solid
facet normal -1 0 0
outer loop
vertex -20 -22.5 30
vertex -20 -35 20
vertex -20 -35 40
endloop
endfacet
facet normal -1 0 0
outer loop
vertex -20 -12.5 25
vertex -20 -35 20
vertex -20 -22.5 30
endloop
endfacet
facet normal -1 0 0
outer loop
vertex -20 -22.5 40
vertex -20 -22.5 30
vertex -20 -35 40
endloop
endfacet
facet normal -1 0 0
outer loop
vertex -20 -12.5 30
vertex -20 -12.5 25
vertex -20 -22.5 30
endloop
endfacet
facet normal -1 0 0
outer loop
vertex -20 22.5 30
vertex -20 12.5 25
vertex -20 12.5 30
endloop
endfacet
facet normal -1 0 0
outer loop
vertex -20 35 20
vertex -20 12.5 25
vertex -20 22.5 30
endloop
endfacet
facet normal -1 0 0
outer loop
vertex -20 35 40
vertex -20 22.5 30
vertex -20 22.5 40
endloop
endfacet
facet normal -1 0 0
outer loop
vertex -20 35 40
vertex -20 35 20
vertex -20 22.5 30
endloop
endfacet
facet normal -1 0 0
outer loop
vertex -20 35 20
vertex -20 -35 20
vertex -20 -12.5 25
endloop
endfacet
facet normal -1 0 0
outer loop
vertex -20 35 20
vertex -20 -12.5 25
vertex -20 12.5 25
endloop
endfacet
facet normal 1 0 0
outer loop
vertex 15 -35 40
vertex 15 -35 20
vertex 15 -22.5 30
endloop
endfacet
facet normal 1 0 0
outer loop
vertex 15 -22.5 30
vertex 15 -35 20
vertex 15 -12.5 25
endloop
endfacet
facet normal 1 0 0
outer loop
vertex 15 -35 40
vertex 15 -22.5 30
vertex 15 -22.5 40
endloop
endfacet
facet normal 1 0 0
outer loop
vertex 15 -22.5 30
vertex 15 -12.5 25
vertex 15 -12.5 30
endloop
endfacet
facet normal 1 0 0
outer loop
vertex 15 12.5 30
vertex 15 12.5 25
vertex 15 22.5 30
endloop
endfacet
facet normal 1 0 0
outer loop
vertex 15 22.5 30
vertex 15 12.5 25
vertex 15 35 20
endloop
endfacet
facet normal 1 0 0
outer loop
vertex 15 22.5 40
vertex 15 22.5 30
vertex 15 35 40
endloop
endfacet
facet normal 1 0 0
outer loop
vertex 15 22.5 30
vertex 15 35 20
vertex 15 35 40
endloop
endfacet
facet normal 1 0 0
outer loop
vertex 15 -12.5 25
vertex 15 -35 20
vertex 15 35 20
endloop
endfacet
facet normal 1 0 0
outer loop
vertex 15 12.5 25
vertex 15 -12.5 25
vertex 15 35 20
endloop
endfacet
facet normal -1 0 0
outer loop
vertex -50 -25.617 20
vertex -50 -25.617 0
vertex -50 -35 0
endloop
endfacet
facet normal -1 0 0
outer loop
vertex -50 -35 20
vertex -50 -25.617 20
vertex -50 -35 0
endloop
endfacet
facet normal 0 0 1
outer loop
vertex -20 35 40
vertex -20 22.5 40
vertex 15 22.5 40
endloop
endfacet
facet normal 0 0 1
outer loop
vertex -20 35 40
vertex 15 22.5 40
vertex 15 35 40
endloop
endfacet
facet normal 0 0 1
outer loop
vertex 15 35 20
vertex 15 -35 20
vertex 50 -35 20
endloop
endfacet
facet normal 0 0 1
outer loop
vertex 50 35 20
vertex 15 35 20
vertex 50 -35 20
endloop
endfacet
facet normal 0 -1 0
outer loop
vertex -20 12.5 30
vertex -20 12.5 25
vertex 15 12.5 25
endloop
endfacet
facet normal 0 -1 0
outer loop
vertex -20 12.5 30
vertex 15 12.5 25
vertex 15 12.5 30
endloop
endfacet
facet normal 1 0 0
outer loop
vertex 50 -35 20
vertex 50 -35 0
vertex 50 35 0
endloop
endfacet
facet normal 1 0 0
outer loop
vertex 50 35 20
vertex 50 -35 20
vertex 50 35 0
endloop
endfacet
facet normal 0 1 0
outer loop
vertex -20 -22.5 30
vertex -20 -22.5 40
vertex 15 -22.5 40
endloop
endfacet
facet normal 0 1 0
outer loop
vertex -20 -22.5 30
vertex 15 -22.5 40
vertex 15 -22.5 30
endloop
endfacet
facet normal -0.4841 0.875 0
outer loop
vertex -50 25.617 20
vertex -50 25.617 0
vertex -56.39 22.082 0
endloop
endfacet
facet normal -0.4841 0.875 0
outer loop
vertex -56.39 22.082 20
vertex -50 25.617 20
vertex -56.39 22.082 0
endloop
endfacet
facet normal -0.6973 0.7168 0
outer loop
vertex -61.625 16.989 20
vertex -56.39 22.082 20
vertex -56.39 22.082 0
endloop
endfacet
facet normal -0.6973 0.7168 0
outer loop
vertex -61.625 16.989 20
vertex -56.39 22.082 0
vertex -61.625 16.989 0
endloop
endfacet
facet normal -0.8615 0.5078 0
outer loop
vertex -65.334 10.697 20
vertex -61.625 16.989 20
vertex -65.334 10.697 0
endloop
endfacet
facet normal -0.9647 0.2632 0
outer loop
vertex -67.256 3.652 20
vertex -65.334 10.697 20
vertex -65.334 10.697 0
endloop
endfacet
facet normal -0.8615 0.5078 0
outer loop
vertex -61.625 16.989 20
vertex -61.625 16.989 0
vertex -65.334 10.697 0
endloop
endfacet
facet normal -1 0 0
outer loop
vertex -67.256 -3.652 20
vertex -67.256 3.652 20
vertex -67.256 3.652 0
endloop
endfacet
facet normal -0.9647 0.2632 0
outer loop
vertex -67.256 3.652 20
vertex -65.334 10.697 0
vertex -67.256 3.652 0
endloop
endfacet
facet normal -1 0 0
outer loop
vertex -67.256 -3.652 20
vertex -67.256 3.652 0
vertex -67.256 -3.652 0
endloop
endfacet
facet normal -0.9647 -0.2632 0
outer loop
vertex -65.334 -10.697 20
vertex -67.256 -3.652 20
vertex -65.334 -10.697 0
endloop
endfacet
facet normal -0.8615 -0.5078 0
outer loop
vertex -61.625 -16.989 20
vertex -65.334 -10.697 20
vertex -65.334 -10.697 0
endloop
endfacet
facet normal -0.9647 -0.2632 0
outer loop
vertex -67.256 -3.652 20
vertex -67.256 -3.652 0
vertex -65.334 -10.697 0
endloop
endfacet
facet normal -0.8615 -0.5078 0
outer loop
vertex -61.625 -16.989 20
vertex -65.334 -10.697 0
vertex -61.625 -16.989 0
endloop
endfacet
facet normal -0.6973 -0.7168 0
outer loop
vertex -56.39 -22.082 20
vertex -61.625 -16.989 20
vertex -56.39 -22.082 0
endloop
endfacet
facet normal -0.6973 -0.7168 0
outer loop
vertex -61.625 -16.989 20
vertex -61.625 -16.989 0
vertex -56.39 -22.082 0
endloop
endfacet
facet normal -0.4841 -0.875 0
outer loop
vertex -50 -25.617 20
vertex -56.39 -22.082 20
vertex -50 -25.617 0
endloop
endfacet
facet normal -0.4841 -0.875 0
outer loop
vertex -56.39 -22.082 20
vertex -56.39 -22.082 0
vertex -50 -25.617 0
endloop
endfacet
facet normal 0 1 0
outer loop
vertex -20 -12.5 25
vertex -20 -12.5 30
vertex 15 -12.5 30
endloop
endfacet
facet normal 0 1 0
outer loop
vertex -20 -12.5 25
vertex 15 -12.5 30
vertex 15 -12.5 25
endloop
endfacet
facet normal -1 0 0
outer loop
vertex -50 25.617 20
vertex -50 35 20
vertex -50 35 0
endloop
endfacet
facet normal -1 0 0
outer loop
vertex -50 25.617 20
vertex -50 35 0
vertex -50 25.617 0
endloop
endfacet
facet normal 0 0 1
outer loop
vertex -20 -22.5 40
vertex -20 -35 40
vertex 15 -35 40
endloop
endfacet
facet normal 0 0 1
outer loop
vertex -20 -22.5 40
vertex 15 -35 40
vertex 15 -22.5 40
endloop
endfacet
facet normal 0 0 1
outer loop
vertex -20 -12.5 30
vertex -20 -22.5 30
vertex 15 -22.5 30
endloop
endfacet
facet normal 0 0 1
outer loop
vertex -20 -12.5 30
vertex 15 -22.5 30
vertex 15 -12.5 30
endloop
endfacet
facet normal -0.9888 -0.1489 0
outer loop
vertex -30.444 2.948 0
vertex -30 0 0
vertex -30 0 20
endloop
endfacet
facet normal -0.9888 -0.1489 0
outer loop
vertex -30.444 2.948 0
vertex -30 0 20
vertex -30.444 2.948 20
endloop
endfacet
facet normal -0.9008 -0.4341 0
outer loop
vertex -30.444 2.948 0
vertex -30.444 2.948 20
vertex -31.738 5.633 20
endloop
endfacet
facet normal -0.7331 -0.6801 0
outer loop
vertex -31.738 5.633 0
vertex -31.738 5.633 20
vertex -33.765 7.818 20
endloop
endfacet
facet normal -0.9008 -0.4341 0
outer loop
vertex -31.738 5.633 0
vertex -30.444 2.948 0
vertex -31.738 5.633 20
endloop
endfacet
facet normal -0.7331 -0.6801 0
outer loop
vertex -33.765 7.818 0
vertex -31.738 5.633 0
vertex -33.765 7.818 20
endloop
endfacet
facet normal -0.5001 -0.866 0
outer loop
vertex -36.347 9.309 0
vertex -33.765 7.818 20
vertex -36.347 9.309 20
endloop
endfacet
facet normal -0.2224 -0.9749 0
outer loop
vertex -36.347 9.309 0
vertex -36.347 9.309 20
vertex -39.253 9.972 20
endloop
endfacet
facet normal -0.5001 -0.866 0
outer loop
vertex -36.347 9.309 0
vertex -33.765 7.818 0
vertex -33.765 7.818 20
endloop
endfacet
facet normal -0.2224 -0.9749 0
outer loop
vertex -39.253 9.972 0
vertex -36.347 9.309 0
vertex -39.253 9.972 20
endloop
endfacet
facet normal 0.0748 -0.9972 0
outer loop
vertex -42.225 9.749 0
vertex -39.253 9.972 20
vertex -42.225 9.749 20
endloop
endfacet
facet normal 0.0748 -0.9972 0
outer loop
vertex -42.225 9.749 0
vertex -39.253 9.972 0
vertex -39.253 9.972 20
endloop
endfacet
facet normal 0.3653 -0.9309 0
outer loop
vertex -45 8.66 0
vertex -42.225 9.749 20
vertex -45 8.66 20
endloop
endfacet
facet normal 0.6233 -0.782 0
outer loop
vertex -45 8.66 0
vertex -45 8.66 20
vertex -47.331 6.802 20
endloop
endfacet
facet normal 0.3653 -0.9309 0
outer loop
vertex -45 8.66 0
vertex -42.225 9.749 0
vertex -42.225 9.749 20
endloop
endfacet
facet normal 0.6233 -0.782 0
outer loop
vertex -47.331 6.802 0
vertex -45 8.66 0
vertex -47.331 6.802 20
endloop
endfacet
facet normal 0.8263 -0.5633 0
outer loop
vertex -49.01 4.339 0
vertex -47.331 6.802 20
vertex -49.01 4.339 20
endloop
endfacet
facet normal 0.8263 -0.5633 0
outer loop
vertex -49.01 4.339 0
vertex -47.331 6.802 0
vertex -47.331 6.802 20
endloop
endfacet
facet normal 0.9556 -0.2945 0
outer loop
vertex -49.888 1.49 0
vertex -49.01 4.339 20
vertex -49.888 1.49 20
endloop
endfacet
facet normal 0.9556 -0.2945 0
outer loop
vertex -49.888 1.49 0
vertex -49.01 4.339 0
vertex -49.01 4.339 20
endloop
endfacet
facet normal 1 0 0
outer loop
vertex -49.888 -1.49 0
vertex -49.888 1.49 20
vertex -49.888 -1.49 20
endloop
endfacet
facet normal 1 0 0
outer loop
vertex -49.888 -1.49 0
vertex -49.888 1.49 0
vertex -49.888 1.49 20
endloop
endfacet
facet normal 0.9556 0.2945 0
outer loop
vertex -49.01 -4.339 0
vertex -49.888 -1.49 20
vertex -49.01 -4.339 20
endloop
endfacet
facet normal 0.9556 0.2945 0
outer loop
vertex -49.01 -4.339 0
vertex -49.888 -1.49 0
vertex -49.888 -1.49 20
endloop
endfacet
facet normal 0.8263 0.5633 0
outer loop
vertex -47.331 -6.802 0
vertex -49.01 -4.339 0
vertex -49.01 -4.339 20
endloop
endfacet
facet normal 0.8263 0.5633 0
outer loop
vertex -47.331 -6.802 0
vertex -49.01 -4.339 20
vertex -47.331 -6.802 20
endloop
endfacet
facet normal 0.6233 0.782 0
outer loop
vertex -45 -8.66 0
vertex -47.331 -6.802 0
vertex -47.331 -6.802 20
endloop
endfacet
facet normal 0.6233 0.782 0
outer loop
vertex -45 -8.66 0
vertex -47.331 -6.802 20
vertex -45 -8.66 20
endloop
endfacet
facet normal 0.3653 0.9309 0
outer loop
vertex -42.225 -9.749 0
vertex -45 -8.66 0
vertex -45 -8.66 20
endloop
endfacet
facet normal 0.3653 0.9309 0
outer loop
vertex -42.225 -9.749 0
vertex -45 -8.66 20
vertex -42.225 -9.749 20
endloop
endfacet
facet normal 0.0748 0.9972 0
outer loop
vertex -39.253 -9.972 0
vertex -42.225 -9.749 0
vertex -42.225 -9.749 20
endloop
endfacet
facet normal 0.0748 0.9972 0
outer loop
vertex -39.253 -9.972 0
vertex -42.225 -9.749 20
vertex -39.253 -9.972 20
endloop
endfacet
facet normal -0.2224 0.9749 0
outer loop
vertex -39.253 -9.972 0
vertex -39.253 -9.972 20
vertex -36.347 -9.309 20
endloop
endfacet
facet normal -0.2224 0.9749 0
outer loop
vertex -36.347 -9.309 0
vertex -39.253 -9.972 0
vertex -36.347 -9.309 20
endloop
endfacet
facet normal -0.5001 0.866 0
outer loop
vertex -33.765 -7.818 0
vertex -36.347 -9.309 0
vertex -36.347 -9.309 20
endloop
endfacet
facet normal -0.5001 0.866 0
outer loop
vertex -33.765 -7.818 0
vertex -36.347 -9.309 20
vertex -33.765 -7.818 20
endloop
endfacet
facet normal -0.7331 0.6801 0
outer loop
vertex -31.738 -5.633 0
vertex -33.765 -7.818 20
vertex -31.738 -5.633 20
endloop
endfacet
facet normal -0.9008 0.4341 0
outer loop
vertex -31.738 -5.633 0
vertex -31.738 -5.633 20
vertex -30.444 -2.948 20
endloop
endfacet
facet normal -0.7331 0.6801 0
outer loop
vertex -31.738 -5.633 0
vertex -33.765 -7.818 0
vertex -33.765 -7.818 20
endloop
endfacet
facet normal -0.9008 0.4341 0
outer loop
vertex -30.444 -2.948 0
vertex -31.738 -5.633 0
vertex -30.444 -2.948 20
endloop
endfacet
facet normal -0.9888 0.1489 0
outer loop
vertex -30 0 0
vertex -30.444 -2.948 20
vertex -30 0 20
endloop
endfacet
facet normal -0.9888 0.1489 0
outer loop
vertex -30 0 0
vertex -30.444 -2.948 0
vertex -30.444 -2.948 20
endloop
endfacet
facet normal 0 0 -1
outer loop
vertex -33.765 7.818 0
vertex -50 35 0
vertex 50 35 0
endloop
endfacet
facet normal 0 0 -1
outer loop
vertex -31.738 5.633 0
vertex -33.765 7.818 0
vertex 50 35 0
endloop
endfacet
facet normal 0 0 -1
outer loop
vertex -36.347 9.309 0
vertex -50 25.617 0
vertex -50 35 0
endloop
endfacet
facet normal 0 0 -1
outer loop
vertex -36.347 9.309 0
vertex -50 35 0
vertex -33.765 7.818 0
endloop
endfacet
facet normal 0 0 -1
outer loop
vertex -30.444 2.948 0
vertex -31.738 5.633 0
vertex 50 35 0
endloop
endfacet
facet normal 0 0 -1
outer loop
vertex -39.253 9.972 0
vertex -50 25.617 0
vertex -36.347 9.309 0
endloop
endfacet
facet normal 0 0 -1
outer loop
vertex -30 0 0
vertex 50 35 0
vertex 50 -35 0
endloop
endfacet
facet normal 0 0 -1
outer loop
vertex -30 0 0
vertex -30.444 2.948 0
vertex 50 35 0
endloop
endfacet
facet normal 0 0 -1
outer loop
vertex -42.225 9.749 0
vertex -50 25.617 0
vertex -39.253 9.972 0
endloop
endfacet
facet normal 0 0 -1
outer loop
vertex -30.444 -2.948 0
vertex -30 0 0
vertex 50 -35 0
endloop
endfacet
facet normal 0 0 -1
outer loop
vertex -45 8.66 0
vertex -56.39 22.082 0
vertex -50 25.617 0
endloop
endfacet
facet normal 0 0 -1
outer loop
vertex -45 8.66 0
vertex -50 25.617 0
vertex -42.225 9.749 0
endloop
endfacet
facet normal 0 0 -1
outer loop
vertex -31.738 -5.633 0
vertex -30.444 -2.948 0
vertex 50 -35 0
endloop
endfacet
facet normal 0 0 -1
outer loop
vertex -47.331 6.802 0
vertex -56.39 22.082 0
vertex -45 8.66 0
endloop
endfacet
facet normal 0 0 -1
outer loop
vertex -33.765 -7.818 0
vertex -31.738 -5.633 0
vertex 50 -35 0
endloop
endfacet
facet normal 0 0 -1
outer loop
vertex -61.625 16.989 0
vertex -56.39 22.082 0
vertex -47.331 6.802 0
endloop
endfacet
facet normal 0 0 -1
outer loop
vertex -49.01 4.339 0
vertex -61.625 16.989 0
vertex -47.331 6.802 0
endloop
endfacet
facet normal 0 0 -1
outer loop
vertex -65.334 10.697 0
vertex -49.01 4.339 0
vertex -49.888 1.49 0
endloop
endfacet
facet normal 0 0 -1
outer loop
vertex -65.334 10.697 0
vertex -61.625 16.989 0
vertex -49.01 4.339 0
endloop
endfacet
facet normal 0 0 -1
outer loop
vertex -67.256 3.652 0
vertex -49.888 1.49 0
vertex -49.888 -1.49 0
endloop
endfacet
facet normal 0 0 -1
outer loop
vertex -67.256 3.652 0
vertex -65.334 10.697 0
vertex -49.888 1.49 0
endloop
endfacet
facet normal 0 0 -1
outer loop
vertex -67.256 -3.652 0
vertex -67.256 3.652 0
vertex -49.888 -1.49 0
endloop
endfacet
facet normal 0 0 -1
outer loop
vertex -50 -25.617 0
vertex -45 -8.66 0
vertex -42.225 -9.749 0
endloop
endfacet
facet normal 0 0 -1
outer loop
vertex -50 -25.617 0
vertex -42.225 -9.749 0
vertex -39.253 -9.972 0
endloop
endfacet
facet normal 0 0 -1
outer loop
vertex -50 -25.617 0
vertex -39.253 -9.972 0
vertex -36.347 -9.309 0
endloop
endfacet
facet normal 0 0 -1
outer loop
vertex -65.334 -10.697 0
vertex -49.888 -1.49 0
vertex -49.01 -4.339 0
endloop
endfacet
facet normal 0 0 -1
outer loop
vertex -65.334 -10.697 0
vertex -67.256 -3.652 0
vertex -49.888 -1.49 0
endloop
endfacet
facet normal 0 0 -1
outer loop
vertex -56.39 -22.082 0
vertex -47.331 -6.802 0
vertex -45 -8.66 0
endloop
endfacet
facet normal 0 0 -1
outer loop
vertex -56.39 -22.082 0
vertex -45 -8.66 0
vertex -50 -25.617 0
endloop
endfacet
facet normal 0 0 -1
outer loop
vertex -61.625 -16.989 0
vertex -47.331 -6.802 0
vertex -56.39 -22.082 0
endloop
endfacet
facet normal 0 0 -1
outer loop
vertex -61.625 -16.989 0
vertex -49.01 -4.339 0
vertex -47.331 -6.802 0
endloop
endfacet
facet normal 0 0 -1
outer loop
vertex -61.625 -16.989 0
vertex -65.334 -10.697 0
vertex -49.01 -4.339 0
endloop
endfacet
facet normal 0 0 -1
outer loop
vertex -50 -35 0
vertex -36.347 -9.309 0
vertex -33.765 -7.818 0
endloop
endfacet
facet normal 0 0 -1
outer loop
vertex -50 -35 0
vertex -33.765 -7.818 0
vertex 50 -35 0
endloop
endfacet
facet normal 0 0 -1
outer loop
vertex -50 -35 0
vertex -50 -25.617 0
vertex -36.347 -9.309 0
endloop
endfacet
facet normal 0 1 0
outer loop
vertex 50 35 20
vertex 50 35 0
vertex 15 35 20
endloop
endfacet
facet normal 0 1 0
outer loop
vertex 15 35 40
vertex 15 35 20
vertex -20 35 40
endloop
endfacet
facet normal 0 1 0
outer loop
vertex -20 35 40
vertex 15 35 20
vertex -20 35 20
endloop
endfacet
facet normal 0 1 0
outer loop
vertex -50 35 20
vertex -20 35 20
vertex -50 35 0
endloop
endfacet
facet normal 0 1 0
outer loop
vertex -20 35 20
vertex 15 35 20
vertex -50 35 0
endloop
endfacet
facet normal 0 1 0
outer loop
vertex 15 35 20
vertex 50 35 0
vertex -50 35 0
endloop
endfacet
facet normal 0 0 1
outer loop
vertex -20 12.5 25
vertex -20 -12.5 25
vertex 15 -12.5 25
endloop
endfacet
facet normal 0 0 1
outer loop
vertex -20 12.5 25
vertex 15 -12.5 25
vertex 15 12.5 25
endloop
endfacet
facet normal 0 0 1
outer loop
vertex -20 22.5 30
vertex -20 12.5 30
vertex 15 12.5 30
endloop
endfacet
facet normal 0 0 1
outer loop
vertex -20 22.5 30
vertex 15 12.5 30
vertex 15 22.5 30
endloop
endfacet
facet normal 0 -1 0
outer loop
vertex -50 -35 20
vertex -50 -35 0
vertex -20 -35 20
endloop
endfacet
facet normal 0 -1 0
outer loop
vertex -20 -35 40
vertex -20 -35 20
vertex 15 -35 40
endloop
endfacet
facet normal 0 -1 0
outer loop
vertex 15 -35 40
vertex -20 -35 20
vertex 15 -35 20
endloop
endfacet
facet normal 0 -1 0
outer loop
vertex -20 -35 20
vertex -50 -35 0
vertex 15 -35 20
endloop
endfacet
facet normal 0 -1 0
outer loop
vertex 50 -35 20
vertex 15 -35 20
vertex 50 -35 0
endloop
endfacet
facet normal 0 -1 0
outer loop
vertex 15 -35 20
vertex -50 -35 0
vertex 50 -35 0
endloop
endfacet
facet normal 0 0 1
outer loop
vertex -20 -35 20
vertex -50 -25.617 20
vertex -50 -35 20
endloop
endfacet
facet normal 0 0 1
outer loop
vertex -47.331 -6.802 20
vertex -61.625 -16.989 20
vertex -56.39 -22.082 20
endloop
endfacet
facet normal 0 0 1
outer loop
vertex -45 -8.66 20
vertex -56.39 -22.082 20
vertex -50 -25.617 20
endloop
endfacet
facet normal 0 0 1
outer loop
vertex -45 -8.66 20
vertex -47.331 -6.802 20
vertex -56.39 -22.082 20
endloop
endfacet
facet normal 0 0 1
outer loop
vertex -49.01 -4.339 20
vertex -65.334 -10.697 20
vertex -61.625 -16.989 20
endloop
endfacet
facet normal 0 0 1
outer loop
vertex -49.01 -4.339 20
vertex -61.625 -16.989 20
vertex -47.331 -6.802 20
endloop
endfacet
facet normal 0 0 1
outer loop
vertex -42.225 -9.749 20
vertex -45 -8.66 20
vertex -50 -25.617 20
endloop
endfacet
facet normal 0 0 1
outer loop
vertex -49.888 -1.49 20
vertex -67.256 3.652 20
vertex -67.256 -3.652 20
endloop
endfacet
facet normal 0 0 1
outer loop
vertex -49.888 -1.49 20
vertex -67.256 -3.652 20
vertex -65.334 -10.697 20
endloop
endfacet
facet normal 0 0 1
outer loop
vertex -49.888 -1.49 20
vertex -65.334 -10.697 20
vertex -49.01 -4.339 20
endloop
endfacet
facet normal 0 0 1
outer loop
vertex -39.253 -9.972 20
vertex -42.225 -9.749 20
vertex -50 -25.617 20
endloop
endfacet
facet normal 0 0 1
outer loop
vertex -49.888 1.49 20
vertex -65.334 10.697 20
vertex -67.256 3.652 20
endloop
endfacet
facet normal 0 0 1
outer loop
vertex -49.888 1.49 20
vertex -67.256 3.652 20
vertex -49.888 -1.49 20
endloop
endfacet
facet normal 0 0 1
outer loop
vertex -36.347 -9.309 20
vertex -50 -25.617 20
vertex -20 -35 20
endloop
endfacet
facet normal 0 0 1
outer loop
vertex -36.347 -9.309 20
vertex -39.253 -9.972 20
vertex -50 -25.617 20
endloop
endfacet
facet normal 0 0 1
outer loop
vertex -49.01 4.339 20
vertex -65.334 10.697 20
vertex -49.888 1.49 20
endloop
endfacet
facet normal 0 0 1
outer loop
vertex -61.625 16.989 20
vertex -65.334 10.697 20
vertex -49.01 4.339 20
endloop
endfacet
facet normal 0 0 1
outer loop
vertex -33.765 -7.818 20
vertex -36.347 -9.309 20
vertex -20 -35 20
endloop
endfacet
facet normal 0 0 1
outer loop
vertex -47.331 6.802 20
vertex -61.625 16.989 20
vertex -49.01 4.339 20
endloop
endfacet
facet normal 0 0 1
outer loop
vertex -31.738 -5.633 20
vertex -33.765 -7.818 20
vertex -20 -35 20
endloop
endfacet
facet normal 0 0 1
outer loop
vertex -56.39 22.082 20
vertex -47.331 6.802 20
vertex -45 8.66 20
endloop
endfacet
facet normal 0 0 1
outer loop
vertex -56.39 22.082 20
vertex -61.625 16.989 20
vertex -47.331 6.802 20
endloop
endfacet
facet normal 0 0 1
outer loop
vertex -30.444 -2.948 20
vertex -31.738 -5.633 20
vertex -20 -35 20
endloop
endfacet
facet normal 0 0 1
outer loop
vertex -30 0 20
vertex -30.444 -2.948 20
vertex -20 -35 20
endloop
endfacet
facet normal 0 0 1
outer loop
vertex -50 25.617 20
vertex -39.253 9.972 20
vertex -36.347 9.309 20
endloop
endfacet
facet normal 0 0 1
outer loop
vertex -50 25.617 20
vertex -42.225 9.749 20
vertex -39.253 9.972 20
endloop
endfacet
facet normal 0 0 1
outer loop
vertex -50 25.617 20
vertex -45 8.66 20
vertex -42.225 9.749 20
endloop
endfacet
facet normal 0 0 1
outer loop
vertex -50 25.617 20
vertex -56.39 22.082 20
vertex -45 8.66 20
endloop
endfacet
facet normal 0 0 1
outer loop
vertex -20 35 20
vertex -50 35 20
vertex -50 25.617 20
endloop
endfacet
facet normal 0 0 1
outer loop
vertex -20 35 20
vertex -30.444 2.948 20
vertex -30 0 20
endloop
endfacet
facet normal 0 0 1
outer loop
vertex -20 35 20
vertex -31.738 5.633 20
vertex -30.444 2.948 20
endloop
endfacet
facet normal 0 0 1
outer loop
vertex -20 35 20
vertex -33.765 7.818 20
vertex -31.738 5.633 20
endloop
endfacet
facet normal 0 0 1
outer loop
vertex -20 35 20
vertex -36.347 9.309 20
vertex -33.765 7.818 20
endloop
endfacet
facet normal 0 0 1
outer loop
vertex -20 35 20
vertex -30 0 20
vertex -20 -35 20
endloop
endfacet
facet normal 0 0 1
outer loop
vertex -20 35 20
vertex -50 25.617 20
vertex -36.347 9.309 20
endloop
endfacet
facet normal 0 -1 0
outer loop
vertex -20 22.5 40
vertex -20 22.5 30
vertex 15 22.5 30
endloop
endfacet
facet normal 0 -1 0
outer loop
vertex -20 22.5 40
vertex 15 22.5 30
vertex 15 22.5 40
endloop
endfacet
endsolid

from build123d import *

# Parameters (mm, degrees)
SKETCH_1_R      = 10
EXTRUDE_1_DEPTH = 20
EXTRUDE_2_DEPTH = 35


with BuildPart() as part:
    # Эскиз1 → Бобышка-Вытянуть1 (new body)
    with BuildSketch(Plane.XY):
        with BuildLine():
            Line((-50, -25.617376915), (-50, -35))
            Line((-50, -35), (50, -35))
            Line((50, -35), (50, 35))
            Line((50, 35), (-50, 35))
            Line((-50, 35), (-50, 25.617376915))
            ThreePointArc((-50, 25.617376915), (-67.5, 0), (-50, -25.617376915))
        make_face()
        with Locations((-40, 0)):
            Circle(SKETCH_1_R, mode=Mode.SUBTRACT)
    extrude(amount=EXTRUDE_1_DEPTH)

    # Эскиз2 → Бобышка-Вытянуть2 (add)
    with BuildSketch(Plane.ZY.offset(20)):
        Polygon((0, 35), (0, -35), (40, -35), (40, -22.5), (30, -22.5), (30, -12.5), (25, -12.5), (25, 12.5), (30, 12.5), (30, 22.5), (40, 22.5), (40, 35), align=None)
    extrude(amount=-EXTRUDE_2_DEPTH)


solid = part.part
